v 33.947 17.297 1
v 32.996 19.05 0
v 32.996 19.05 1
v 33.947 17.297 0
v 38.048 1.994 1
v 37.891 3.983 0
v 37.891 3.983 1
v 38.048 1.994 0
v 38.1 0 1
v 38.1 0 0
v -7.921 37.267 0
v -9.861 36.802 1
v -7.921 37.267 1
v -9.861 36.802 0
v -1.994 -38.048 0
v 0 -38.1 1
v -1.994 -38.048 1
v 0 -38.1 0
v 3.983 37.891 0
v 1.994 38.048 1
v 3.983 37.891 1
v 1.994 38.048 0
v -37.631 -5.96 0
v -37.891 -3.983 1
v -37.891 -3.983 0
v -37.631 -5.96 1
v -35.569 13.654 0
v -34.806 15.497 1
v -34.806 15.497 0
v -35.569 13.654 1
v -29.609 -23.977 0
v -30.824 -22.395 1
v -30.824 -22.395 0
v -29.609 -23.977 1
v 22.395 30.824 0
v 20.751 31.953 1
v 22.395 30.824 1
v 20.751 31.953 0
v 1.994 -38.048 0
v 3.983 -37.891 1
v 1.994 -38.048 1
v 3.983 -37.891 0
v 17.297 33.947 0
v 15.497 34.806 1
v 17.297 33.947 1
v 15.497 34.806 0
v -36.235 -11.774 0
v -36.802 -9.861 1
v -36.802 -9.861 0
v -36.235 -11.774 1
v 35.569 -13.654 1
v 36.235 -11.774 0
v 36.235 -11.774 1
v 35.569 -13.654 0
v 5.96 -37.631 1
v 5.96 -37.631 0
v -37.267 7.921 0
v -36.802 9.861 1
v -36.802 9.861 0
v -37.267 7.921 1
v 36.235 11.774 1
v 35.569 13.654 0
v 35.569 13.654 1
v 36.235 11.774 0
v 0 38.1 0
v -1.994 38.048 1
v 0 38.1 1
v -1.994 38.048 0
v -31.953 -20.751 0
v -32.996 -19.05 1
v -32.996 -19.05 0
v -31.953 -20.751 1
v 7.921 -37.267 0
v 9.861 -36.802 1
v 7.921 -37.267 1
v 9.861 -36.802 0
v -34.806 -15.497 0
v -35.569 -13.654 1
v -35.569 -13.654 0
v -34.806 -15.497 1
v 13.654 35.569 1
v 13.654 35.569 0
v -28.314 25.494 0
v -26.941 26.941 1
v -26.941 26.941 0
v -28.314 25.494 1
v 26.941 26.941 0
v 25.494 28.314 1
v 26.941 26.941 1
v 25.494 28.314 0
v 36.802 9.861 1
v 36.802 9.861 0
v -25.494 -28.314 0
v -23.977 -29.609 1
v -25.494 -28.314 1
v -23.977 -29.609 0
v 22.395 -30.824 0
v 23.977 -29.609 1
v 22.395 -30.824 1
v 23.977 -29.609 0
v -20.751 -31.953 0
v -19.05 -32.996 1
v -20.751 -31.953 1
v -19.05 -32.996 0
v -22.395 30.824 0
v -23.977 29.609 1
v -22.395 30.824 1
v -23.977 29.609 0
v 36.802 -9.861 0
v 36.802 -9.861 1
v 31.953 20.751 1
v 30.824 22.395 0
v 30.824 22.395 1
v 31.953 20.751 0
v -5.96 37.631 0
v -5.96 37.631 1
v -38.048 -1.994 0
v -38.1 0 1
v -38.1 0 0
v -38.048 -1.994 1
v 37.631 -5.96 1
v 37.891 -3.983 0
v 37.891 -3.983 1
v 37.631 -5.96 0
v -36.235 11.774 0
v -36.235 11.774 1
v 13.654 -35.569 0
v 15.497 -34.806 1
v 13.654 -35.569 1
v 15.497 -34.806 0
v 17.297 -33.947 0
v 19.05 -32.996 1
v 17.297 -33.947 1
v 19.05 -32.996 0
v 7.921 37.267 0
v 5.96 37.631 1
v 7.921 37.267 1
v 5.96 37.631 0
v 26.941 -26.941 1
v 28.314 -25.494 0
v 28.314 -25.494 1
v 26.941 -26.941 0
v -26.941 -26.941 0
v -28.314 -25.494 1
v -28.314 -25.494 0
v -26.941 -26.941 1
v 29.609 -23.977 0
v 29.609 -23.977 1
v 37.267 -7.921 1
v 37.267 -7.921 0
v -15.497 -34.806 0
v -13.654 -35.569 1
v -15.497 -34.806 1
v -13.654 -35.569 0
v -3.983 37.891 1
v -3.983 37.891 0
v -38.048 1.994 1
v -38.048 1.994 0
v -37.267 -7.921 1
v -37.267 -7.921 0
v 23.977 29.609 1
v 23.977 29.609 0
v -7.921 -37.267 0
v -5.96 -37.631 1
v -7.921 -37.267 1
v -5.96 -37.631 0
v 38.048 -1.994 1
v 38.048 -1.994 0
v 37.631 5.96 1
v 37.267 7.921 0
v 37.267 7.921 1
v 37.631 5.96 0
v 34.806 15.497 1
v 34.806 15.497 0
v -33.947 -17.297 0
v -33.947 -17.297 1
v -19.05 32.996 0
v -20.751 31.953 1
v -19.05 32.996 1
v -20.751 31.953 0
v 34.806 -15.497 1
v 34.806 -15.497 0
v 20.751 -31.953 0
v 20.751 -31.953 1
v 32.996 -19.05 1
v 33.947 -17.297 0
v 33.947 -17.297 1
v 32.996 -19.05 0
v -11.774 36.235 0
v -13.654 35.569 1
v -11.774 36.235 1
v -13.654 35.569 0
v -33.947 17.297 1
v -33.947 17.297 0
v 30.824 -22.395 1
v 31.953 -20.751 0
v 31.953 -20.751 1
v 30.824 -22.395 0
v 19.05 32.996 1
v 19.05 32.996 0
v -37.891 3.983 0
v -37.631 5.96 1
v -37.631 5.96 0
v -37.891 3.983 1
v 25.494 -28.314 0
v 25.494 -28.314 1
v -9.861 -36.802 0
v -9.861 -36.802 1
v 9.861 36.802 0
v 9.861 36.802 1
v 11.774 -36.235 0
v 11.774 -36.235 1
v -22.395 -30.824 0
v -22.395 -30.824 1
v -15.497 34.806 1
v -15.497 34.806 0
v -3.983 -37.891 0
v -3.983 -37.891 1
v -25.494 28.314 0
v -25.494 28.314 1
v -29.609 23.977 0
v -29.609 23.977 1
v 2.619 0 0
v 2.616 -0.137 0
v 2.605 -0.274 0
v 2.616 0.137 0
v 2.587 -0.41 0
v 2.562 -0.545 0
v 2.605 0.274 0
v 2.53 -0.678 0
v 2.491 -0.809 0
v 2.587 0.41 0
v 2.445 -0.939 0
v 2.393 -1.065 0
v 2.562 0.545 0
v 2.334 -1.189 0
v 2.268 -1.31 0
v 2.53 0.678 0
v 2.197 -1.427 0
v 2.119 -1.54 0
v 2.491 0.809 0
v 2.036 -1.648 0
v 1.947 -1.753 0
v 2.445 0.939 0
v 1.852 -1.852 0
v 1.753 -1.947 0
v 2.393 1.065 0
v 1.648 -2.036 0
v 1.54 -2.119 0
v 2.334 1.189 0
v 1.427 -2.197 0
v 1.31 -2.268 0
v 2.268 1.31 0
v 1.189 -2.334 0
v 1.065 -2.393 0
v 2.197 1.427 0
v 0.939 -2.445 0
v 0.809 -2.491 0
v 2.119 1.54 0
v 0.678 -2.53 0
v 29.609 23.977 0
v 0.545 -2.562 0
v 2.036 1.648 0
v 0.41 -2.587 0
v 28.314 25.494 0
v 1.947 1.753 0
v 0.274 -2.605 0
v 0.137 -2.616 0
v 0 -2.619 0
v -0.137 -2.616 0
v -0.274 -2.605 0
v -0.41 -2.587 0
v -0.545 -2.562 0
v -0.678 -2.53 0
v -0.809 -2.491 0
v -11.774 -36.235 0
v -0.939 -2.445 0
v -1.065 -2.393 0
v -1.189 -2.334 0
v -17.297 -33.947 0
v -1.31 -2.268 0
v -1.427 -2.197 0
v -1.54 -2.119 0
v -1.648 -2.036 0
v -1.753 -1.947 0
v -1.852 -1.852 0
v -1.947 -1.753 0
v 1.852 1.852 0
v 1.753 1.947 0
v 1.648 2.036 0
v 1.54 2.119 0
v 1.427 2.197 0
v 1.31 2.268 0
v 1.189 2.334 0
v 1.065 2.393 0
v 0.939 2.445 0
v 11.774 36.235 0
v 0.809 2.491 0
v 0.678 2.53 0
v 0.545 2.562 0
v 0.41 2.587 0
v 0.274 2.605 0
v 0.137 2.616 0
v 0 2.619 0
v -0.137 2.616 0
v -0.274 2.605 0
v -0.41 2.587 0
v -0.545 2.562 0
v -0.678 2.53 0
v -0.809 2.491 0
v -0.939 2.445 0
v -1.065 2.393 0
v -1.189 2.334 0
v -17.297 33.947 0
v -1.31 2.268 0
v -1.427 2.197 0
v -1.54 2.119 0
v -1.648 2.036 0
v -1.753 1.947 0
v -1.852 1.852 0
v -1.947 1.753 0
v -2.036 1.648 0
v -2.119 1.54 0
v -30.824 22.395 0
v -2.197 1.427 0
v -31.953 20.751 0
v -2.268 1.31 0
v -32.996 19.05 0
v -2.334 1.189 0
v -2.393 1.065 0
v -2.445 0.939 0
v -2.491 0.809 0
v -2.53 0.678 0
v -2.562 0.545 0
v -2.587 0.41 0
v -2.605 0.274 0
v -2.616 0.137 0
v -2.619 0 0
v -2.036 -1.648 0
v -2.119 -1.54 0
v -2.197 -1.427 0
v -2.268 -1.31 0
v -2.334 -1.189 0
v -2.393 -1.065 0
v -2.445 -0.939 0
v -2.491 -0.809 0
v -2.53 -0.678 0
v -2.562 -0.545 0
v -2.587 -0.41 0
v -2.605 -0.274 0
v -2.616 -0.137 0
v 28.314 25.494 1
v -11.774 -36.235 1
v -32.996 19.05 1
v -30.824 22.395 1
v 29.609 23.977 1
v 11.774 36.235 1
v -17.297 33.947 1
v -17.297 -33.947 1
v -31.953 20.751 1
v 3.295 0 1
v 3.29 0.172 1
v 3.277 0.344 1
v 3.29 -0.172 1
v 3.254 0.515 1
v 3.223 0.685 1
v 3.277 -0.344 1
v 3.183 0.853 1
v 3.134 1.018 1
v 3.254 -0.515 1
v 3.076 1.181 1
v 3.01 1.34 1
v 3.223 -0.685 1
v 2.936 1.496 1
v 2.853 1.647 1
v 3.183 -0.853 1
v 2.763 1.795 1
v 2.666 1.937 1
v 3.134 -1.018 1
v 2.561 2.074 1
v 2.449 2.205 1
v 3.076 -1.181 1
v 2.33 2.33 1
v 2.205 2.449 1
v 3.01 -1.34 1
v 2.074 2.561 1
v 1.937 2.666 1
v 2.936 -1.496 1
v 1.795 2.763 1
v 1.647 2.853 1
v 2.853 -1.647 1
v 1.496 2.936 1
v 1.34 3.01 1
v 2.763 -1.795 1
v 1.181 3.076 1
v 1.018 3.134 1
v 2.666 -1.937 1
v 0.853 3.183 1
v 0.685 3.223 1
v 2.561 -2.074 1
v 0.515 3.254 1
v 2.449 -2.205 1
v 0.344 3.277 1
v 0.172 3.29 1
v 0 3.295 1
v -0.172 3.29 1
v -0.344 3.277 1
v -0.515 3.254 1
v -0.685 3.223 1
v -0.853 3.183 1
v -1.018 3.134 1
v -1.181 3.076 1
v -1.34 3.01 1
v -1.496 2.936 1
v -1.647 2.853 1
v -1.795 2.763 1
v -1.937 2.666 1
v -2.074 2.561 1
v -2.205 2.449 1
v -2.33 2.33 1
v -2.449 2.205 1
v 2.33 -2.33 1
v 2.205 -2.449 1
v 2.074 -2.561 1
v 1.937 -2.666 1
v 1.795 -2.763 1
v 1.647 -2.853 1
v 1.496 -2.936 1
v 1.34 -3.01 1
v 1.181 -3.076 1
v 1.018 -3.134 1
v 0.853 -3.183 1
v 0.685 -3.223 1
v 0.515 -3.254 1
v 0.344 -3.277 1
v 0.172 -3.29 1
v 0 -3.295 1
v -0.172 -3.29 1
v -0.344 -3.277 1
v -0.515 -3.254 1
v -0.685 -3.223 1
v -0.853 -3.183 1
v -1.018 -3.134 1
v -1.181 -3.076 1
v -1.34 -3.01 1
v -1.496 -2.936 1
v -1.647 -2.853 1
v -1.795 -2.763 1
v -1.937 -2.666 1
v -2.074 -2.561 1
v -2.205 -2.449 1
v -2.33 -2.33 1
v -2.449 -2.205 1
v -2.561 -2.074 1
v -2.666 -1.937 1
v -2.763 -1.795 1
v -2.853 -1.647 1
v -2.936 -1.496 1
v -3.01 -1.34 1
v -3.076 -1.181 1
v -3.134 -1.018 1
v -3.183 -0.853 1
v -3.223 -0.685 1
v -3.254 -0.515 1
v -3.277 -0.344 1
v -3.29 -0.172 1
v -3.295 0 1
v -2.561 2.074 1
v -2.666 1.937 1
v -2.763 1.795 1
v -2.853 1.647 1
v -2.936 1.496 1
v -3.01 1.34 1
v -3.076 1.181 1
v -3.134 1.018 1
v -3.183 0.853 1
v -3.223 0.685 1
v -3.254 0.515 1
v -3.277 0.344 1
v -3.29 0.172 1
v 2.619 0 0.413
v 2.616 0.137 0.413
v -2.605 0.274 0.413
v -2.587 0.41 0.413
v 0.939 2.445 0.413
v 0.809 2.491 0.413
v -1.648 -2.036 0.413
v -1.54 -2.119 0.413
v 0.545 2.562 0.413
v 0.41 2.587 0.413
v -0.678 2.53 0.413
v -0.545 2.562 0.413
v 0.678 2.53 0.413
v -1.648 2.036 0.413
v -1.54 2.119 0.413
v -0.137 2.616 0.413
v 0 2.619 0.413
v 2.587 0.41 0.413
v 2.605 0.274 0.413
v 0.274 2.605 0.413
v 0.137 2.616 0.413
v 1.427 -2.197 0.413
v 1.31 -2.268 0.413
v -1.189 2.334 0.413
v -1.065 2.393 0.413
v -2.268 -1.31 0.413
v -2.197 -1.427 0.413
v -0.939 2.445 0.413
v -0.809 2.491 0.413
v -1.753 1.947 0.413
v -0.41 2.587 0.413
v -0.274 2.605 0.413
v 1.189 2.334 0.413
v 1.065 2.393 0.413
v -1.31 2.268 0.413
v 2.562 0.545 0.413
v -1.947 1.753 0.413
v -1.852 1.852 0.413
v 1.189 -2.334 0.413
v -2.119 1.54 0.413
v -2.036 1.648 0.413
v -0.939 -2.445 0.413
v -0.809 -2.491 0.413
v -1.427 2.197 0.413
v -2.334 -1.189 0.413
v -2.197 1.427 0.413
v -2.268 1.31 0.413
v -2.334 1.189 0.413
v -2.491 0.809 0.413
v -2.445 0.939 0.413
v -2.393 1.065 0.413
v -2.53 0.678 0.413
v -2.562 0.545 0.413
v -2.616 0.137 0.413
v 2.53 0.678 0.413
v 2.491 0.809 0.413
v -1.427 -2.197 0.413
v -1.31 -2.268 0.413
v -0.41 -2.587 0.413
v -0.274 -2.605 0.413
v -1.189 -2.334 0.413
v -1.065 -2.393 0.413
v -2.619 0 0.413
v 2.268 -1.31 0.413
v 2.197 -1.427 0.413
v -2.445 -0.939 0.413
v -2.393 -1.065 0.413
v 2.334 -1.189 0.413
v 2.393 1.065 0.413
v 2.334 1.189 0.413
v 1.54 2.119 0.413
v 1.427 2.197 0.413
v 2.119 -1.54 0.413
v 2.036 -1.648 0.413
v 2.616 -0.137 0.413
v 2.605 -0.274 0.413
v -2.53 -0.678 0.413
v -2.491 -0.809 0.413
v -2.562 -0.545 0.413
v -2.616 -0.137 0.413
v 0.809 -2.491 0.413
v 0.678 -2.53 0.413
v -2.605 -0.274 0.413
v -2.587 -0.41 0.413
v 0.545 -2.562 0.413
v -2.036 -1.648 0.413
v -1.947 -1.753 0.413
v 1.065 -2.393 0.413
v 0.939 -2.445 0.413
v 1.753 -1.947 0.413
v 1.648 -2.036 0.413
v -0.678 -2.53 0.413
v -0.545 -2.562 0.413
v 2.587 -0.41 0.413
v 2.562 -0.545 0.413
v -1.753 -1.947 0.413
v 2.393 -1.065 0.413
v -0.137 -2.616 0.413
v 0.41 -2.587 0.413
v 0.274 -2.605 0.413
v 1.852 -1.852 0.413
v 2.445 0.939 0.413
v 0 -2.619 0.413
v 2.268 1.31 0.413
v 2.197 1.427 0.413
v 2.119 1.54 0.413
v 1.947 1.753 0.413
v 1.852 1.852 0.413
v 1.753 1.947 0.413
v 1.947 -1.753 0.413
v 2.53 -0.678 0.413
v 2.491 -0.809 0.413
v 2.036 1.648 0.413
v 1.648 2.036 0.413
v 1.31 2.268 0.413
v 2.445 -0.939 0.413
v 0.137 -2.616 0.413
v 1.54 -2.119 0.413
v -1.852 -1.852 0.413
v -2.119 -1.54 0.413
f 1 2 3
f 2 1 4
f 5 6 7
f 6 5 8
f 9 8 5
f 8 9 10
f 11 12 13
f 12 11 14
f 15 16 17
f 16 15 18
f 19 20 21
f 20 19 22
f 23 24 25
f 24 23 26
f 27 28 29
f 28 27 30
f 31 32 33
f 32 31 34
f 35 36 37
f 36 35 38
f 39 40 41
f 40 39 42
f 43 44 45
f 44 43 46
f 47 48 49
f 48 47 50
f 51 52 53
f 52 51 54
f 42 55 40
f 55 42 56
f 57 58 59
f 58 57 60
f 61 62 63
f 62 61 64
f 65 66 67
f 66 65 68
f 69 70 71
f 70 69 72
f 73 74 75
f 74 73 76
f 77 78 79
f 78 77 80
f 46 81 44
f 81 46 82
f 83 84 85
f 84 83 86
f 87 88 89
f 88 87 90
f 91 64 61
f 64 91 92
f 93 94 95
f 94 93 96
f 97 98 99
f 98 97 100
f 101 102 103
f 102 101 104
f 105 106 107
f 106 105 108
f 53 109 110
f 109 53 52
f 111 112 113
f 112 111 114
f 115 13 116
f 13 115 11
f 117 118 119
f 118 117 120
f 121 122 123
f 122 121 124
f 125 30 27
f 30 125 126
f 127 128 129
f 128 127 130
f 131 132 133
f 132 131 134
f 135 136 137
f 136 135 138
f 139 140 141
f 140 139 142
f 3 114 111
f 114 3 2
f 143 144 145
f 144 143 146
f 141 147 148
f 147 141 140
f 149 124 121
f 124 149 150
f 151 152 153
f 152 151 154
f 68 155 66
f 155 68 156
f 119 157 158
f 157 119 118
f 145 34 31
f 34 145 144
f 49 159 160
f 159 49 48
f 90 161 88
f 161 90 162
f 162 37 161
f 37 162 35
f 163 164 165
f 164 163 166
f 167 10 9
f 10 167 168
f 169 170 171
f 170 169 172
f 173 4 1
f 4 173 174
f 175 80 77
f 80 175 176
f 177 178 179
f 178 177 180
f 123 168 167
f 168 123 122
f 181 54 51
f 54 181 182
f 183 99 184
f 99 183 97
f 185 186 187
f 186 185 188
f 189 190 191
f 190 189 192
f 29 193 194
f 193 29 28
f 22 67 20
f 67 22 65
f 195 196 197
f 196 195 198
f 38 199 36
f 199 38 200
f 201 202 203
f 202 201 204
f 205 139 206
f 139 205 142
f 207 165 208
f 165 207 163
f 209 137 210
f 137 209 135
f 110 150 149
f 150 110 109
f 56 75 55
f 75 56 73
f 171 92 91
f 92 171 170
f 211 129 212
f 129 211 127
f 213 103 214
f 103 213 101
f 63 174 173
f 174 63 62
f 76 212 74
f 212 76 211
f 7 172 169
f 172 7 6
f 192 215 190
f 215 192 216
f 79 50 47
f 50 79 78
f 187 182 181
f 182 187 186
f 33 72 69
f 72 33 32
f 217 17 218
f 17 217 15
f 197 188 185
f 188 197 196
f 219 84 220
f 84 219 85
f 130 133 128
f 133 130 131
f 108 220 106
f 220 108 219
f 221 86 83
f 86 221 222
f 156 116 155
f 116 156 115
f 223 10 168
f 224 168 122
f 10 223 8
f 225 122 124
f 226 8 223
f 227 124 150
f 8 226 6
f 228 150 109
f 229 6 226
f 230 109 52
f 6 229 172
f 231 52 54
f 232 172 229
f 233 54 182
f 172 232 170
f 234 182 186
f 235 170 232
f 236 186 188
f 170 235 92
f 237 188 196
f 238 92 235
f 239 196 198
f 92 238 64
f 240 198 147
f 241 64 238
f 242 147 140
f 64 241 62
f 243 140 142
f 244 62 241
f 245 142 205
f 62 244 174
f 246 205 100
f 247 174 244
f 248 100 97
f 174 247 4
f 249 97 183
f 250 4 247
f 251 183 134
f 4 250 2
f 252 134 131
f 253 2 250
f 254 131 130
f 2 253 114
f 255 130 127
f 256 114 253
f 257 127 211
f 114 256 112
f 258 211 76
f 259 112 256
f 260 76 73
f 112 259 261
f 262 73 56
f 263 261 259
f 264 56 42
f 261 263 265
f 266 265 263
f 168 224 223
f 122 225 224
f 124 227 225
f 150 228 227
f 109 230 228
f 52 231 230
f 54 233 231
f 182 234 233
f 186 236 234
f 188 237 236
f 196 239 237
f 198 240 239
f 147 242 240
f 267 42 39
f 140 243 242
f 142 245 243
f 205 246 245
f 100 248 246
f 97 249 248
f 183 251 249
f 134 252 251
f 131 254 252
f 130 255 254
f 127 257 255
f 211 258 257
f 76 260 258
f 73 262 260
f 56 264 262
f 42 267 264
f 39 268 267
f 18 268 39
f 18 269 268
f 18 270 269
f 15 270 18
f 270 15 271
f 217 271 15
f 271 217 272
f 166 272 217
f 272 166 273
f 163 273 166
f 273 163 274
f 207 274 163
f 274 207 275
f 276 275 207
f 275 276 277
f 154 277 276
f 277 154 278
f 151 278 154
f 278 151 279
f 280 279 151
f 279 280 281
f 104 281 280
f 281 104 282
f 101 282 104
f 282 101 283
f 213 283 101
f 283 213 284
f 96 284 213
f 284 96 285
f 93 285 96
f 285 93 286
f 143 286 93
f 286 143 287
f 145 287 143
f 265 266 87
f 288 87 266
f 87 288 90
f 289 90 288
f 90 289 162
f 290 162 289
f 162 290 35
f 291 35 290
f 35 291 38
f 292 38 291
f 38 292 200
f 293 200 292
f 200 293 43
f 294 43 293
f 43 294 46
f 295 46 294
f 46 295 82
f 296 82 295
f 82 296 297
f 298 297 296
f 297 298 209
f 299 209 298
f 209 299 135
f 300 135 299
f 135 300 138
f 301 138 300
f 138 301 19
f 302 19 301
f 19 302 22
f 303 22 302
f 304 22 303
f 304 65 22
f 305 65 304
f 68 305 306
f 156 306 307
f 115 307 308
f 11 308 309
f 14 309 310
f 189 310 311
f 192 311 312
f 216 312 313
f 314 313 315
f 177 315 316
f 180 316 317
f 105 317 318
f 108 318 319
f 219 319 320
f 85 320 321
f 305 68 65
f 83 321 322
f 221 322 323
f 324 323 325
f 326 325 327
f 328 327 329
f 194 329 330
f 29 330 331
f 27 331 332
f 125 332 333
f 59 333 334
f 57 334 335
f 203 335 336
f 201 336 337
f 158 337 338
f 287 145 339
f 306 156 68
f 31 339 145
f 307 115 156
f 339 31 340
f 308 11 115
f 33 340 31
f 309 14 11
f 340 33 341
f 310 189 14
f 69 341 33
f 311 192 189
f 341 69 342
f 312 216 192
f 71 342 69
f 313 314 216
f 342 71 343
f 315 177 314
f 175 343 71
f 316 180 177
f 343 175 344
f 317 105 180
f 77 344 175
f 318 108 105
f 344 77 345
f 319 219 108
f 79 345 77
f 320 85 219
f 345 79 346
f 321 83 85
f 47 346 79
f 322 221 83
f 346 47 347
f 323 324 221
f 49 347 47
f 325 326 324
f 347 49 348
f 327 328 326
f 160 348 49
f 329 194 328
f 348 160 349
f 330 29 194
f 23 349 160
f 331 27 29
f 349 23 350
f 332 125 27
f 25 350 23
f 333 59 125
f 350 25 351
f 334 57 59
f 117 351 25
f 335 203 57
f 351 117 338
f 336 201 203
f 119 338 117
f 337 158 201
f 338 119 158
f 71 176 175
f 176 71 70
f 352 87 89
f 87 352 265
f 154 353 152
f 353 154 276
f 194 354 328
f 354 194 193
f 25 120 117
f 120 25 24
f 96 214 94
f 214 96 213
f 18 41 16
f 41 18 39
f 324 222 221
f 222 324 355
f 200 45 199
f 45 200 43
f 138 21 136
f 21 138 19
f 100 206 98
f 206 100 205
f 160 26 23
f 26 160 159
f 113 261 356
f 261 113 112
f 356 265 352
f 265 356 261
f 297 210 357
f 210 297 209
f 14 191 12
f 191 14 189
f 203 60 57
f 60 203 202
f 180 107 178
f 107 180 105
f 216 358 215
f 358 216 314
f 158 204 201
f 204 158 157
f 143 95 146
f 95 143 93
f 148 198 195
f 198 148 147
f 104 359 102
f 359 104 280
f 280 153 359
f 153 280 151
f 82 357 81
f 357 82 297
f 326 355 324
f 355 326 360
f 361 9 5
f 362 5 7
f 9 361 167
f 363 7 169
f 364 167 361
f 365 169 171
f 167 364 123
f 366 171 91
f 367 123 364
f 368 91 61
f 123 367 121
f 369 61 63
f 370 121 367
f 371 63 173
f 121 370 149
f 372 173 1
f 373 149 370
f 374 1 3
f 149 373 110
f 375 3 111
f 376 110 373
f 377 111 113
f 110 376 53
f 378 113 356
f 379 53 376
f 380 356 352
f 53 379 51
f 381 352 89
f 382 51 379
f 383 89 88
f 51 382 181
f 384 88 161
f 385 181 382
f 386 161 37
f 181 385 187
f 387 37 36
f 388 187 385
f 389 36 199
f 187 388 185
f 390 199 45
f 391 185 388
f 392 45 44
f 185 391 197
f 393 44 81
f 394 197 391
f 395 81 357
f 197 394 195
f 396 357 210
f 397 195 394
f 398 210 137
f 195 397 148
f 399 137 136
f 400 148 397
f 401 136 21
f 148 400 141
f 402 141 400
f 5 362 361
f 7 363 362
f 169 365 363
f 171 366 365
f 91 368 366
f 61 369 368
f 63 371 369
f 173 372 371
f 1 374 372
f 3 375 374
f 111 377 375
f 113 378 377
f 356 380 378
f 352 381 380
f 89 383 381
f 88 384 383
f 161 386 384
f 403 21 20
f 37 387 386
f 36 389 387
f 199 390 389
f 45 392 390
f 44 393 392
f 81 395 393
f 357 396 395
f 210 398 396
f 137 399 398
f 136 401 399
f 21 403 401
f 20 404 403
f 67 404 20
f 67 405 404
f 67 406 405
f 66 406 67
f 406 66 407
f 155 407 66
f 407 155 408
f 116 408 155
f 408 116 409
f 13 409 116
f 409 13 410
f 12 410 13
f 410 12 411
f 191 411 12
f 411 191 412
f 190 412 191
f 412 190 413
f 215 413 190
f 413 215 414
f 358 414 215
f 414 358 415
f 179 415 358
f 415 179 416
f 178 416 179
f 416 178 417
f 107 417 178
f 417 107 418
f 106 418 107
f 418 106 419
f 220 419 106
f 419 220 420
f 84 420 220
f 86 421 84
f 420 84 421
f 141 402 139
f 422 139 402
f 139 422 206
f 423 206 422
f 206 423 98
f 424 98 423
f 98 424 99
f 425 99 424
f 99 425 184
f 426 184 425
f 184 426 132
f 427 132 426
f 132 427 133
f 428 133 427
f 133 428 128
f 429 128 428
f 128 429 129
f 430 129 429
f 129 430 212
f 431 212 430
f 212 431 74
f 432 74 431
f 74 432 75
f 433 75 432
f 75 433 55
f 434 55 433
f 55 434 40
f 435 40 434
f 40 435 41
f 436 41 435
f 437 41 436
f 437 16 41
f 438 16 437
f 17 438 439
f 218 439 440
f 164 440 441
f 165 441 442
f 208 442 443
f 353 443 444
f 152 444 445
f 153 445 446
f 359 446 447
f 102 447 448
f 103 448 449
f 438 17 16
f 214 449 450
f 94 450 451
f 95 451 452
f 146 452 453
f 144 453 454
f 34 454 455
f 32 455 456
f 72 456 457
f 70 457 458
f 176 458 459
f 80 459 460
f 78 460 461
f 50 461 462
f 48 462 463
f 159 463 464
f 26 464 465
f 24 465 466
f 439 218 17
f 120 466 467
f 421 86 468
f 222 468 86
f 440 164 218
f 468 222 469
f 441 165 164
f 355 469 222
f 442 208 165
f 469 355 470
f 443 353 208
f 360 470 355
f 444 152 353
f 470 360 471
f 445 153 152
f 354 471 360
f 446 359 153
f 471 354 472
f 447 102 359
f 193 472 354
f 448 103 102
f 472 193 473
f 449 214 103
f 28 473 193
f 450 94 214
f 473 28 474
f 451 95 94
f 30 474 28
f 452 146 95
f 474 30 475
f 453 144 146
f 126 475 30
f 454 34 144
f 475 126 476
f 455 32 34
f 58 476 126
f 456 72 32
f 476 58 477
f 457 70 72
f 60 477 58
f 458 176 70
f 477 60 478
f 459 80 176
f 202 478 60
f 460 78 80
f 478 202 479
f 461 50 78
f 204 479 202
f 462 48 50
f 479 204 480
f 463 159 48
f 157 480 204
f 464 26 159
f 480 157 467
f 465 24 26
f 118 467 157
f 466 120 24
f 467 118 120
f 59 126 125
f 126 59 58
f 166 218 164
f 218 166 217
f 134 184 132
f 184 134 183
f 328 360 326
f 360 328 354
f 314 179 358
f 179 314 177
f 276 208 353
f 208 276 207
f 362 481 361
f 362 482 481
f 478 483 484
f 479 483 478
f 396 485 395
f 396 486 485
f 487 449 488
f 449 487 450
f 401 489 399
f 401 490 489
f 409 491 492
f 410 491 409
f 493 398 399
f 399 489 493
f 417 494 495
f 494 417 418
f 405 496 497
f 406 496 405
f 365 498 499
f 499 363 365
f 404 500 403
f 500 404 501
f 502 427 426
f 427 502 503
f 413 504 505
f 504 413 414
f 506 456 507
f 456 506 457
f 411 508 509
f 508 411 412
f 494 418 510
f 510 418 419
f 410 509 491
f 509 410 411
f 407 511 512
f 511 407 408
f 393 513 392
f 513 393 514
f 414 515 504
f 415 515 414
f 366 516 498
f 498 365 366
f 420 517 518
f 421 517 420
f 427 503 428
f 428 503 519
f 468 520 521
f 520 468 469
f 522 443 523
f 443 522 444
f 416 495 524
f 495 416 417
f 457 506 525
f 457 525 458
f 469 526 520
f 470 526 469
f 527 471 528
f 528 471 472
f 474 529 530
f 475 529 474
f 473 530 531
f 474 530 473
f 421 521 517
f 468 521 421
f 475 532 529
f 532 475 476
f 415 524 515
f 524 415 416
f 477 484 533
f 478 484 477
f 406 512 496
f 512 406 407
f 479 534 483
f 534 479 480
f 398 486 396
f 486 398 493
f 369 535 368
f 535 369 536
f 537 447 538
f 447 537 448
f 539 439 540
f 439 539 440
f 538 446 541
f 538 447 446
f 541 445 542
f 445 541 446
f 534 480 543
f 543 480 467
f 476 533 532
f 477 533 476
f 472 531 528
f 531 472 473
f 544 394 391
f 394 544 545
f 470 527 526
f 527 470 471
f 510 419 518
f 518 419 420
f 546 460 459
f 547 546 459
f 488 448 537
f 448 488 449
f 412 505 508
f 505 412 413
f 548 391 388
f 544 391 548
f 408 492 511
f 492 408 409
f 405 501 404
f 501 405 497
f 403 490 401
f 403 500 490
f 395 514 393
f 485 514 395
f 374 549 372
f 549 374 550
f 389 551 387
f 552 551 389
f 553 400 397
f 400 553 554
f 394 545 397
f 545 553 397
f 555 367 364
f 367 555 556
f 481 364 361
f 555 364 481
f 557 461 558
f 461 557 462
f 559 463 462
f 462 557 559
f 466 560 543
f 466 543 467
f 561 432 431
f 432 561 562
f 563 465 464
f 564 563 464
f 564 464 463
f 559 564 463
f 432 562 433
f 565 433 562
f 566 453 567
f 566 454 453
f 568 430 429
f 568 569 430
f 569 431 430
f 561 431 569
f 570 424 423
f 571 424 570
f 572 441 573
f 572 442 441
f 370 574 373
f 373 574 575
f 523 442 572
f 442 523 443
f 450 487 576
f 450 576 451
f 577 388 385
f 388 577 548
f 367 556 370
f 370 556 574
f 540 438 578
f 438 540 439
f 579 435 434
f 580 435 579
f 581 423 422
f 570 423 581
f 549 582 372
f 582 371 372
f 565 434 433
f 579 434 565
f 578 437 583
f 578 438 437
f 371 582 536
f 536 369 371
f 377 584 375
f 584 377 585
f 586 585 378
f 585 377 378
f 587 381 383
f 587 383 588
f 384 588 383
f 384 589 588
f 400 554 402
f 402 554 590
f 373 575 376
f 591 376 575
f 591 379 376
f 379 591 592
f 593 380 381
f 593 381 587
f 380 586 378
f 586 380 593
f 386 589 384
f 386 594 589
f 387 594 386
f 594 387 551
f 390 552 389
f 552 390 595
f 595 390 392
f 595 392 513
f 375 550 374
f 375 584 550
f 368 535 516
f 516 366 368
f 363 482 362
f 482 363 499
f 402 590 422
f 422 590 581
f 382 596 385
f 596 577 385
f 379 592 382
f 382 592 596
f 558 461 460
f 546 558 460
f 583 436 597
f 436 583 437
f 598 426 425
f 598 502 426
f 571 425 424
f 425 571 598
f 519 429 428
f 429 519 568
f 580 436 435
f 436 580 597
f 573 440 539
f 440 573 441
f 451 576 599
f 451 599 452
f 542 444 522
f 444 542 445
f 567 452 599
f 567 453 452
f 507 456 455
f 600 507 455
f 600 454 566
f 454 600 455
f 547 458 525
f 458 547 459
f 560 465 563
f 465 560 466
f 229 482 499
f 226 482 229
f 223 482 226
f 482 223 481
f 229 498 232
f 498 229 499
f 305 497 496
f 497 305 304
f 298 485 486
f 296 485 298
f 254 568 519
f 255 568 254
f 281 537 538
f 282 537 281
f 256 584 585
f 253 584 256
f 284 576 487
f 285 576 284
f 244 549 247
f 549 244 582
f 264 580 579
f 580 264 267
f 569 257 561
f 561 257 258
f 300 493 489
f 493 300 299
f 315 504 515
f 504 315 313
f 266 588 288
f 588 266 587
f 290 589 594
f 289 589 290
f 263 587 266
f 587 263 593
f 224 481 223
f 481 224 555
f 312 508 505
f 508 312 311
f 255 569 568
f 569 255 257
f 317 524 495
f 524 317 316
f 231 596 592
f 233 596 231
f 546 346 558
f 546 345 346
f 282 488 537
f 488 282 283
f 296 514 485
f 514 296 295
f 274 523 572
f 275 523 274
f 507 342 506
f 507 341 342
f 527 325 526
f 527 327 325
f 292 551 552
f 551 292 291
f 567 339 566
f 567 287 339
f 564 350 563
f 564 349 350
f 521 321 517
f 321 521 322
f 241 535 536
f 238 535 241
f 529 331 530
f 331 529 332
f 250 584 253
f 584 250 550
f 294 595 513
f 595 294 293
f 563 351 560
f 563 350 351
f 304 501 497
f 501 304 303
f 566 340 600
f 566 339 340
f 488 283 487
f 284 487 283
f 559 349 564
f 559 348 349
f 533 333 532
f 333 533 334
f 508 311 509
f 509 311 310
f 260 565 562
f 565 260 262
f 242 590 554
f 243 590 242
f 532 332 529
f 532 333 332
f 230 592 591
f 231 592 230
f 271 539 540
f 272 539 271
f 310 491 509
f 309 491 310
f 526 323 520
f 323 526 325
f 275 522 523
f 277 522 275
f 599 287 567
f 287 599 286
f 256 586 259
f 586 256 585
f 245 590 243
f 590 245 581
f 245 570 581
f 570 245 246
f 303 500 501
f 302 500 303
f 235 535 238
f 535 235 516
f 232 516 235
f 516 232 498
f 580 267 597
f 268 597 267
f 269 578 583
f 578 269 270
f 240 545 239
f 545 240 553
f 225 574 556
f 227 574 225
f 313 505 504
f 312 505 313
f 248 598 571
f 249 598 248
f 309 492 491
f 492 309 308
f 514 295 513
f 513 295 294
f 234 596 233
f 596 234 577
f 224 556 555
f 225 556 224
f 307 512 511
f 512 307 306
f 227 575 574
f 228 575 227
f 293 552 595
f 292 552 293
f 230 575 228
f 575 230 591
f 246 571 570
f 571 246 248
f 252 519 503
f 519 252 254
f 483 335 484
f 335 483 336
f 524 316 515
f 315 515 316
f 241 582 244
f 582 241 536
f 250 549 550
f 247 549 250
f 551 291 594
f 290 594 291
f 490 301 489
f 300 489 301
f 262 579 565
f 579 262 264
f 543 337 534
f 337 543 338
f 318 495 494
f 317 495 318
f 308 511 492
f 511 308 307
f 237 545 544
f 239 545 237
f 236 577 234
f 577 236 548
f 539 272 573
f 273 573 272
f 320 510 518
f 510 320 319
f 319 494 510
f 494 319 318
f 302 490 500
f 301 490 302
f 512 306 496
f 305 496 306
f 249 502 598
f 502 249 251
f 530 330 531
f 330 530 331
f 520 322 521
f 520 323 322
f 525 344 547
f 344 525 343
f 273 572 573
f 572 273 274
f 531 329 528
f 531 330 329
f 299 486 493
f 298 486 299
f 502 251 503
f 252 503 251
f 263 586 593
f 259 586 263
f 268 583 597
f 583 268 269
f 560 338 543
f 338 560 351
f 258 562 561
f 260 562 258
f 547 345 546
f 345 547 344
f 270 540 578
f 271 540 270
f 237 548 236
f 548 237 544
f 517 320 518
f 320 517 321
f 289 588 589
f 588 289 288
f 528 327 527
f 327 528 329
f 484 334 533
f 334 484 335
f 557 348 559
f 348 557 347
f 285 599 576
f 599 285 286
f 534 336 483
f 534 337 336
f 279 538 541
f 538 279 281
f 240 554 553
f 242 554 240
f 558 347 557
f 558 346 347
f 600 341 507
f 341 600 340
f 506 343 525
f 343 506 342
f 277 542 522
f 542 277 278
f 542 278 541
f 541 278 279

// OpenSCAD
$fn=120;


MM=25.4;
DIA= 3 * MM;

CIRC_DIA= DIA * 2;
HEIGHT = 5/8 * MM;

//  ROOT  HEAD_DIA
SCREWS =[
    [0, 1/16, 	7/64  ],
    [1, 5/64,	9/64  ],
    [2, 3/32, 	5/32  ],
    [3, 3/32, 	3/16  ],
    [4, 7/64, 	13/64 ],
    [5, 1/8, 	15/64 ],
    [6, 9/64, 	17/64 ],
    [7, 5/32, 	9/32  ],
    [8, 5/32, 	5/16  ],
    [9, 11/64, 	11/32 ],
    [10,3/16, 	23/64 ]
];	

module Xcountersink(screw_number = 4, length_mm = 10)
{
    top_dia_mm = SCREWS[screw_number].z  * MM * 1.1;
    root_dia_mm = SCREWS[screw_number].y * MM;
    
    angle = 82; //iso
    angle2 = 180 -  angle/2  - 90;  // face to sink angle.
    
    deep_mm = (top_dia_mm /2) / tan(angle2);
    echo ("deep in = ", deep_mm, " ANGLE = ", angle2 );
    
    // face of screwhead level on plane [0,0,0]
    translate([ 0, 0, -deep_mm])
    {
        #cylinder(d2 = top_dia_mm, d1 = 0, h = deep_mm);
        echo ("**** root dia= ", SCREWS[screw_number]);
    }
     
    // if you sink it too far, make a nice hole above 
    #cylinder(d = top_dia_mm * 1.1,5);
    
    // make drill hole
    translate([ 0, 0, -length_mm])
    #cylinder(d = root_dia_mm * 1.1, h = length_mm);
}

difference()
{
    difference()
    {
        difference()
        {
            cylinder(h = HEIGHT, d = DIA, false);
         
            color("GREEN")
            translate([0, 0, + CIRC_DIA /2 + HEIGHT * 1/4  ])
            sphere(d = CIRC_DIA);
        }
        
        translate([0, 0,  2.5 ]) 
        {
            // tweak in place
            Xcountersink(10);
        }

        translate([2.5, -2.5,  4 ]) 
        {
            // tweak in place
            rotate([ 0, 1.4, 0])
            #cube([ DIA, 5, 20]);
        }
        
    }
    //cube ([DIA,DIA,DIA], false);
}
